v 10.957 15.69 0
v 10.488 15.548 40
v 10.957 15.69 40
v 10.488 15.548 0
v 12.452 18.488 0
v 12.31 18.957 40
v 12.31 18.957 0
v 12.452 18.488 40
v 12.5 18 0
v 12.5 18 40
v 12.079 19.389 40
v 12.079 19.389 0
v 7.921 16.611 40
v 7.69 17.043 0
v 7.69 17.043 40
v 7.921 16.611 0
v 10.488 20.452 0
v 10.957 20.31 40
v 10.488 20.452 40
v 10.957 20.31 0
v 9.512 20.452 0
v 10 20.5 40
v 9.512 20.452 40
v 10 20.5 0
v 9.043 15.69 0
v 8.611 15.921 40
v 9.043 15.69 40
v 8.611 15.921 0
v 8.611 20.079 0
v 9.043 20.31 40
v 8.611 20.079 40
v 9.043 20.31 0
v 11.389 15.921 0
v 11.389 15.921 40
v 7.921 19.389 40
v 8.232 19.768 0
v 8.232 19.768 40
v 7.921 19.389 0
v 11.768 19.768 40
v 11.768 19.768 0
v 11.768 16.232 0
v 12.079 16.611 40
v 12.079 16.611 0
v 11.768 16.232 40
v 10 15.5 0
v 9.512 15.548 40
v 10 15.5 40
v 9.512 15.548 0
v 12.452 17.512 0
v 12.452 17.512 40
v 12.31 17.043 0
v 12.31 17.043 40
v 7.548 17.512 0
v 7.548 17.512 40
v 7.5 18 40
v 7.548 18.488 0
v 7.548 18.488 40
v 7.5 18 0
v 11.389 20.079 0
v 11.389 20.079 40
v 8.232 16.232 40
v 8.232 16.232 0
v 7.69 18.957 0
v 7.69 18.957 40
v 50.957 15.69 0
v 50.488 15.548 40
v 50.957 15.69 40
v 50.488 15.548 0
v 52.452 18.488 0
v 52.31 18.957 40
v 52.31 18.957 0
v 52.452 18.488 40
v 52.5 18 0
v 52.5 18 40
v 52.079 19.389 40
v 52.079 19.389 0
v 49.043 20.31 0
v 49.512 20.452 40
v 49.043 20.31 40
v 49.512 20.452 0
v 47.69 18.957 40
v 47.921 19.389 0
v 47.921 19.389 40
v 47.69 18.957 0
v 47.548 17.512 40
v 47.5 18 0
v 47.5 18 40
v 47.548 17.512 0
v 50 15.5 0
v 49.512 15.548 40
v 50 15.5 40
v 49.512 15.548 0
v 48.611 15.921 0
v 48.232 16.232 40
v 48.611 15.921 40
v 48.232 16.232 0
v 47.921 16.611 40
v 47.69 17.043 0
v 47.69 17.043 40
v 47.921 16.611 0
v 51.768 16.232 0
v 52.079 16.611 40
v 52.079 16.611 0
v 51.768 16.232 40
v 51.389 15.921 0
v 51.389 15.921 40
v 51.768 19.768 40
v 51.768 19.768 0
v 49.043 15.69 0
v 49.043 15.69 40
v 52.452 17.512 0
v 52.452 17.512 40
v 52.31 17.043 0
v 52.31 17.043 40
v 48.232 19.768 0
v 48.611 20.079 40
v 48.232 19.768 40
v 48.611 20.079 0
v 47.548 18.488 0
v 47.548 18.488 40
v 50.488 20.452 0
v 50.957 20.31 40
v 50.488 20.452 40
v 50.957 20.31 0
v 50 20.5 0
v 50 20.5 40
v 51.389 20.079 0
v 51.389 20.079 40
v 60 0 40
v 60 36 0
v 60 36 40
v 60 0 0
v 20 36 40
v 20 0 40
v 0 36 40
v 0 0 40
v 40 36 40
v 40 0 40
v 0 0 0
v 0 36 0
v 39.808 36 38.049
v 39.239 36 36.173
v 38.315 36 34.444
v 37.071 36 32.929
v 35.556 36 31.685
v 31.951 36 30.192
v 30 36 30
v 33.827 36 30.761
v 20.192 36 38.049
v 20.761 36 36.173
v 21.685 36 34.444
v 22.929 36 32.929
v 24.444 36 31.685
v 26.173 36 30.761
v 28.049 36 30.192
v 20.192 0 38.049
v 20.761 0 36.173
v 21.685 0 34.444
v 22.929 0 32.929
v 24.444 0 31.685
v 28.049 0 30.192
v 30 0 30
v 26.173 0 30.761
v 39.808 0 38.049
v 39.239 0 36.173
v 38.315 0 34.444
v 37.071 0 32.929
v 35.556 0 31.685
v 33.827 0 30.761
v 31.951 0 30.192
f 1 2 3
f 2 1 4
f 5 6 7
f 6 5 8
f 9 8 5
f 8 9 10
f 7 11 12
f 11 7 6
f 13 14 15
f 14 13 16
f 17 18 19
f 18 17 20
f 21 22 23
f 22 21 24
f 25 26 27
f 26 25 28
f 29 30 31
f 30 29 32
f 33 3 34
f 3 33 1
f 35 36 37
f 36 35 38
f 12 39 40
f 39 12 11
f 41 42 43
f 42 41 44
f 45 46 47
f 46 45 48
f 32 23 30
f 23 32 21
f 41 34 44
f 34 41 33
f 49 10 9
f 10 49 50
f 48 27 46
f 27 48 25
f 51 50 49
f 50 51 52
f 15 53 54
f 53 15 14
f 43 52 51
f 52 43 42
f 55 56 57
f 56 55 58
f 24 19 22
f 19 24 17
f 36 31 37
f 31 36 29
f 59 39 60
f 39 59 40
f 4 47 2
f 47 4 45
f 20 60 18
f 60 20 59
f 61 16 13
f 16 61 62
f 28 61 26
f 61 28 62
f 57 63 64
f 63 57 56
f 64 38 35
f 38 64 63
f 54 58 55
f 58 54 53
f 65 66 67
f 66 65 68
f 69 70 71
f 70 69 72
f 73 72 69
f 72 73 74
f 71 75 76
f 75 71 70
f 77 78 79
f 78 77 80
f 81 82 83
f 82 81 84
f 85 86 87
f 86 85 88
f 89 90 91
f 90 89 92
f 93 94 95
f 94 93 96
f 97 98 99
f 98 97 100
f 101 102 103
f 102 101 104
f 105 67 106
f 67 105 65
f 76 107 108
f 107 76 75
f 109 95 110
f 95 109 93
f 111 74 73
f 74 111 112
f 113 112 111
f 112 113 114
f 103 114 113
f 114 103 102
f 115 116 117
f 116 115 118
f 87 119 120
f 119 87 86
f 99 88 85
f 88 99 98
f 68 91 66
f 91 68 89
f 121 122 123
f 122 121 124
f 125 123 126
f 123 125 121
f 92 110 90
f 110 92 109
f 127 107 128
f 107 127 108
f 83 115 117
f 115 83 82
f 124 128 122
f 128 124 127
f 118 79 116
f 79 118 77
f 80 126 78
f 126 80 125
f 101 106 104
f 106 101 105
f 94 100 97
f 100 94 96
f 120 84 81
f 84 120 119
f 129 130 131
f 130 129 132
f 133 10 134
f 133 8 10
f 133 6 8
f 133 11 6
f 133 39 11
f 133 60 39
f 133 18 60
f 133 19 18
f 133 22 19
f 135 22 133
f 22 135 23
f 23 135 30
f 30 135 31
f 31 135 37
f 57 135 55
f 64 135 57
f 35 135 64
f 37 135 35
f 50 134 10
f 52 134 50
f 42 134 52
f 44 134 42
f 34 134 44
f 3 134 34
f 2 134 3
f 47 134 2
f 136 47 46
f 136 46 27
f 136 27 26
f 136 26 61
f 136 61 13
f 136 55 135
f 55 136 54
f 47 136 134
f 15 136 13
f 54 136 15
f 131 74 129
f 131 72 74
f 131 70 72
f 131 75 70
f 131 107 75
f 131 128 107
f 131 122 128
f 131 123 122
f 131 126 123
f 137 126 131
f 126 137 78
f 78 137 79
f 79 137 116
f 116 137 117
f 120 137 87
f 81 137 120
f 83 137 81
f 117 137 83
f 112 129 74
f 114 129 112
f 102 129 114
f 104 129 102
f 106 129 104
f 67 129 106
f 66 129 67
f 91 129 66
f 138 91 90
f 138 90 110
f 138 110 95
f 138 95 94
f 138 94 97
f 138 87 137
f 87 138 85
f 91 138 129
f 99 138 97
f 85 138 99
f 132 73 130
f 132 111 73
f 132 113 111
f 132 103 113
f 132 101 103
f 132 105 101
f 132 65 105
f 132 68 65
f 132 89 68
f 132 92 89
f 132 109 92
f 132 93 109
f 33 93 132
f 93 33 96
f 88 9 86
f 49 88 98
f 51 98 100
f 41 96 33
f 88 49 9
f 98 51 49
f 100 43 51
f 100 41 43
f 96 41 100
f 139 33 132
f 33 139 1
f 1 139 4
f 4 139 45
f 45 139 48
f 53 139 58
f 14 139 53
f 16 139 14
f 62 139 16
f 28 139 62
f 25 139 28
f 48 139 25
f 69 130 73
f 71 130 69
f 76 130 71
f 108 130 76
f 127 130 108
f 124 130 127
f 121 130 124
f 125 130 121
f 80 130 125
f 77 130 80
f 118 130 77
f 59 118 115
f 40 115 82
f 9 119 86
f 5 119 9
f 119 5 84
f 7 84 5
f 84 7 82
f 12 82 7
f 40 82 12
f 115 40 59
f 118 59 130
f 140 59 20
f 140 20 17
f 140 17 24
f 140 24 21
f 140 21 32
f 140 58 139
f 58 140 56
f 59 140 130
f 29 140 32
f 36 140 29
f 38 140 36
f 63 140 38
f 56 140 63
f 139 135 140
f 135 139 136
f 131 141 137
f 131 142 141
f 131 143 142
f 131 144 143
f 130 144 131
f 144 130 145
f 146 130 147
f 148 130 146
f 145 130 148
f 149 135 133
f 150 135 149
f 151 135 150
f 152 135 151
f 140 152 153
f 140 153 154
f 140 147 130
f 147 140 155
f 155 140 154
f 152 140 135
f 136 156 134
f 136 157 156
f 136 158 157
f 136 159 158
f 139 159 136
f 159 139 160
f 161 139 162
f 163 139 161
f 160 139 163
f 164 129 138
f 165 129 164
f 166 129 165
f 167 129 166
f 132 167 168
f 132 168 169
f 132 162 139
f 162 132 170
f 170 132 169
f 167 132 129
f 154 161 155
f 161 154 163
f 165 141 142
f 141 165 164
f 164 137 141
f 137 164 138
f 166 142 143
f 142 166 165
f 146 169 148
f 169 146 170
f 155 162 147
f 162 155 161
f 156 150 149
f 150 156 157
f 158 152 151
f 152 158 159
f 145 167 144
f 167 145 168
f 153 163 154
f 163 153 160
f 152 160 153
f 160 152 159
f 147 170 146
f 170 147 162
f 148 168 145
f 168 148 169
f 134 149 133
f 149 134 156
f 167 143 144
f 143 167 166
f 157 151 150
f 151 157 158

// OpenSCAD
$fn = 32;

// ----------------------------------------------------------------------
// Saddle clamp: plain shaft clamp
// ----------------------------------------------------------------------

// --- parameters (mm) ---
blk_l = 60;               // block length, X
blk_w = 36;               // block width, Y
blk_h = 40;               // block height
clamp_r = 10;             // shaft groove radius
hole_r = 2.5;             // bolt hole radius
hole_m = 10;              // bolt hole margin from the ends

saw_depth = clamp_r + 3;  // saw kerf depth

difference() {
  cube([blk_l, blk_w, blk_h]);
  translate([blk_l / 2, -1, blk_h])
    rotate([-90, 0, 0])
      cylinder(h = blk_w + 2, r = clamp_r);
  for (sx = [0, 1])
    translate([sx ? blk_l - hole_m : hole_m, blk_w / 2, -1])
      cylinder(r = hole_r, h = blk_h + 2);
}
